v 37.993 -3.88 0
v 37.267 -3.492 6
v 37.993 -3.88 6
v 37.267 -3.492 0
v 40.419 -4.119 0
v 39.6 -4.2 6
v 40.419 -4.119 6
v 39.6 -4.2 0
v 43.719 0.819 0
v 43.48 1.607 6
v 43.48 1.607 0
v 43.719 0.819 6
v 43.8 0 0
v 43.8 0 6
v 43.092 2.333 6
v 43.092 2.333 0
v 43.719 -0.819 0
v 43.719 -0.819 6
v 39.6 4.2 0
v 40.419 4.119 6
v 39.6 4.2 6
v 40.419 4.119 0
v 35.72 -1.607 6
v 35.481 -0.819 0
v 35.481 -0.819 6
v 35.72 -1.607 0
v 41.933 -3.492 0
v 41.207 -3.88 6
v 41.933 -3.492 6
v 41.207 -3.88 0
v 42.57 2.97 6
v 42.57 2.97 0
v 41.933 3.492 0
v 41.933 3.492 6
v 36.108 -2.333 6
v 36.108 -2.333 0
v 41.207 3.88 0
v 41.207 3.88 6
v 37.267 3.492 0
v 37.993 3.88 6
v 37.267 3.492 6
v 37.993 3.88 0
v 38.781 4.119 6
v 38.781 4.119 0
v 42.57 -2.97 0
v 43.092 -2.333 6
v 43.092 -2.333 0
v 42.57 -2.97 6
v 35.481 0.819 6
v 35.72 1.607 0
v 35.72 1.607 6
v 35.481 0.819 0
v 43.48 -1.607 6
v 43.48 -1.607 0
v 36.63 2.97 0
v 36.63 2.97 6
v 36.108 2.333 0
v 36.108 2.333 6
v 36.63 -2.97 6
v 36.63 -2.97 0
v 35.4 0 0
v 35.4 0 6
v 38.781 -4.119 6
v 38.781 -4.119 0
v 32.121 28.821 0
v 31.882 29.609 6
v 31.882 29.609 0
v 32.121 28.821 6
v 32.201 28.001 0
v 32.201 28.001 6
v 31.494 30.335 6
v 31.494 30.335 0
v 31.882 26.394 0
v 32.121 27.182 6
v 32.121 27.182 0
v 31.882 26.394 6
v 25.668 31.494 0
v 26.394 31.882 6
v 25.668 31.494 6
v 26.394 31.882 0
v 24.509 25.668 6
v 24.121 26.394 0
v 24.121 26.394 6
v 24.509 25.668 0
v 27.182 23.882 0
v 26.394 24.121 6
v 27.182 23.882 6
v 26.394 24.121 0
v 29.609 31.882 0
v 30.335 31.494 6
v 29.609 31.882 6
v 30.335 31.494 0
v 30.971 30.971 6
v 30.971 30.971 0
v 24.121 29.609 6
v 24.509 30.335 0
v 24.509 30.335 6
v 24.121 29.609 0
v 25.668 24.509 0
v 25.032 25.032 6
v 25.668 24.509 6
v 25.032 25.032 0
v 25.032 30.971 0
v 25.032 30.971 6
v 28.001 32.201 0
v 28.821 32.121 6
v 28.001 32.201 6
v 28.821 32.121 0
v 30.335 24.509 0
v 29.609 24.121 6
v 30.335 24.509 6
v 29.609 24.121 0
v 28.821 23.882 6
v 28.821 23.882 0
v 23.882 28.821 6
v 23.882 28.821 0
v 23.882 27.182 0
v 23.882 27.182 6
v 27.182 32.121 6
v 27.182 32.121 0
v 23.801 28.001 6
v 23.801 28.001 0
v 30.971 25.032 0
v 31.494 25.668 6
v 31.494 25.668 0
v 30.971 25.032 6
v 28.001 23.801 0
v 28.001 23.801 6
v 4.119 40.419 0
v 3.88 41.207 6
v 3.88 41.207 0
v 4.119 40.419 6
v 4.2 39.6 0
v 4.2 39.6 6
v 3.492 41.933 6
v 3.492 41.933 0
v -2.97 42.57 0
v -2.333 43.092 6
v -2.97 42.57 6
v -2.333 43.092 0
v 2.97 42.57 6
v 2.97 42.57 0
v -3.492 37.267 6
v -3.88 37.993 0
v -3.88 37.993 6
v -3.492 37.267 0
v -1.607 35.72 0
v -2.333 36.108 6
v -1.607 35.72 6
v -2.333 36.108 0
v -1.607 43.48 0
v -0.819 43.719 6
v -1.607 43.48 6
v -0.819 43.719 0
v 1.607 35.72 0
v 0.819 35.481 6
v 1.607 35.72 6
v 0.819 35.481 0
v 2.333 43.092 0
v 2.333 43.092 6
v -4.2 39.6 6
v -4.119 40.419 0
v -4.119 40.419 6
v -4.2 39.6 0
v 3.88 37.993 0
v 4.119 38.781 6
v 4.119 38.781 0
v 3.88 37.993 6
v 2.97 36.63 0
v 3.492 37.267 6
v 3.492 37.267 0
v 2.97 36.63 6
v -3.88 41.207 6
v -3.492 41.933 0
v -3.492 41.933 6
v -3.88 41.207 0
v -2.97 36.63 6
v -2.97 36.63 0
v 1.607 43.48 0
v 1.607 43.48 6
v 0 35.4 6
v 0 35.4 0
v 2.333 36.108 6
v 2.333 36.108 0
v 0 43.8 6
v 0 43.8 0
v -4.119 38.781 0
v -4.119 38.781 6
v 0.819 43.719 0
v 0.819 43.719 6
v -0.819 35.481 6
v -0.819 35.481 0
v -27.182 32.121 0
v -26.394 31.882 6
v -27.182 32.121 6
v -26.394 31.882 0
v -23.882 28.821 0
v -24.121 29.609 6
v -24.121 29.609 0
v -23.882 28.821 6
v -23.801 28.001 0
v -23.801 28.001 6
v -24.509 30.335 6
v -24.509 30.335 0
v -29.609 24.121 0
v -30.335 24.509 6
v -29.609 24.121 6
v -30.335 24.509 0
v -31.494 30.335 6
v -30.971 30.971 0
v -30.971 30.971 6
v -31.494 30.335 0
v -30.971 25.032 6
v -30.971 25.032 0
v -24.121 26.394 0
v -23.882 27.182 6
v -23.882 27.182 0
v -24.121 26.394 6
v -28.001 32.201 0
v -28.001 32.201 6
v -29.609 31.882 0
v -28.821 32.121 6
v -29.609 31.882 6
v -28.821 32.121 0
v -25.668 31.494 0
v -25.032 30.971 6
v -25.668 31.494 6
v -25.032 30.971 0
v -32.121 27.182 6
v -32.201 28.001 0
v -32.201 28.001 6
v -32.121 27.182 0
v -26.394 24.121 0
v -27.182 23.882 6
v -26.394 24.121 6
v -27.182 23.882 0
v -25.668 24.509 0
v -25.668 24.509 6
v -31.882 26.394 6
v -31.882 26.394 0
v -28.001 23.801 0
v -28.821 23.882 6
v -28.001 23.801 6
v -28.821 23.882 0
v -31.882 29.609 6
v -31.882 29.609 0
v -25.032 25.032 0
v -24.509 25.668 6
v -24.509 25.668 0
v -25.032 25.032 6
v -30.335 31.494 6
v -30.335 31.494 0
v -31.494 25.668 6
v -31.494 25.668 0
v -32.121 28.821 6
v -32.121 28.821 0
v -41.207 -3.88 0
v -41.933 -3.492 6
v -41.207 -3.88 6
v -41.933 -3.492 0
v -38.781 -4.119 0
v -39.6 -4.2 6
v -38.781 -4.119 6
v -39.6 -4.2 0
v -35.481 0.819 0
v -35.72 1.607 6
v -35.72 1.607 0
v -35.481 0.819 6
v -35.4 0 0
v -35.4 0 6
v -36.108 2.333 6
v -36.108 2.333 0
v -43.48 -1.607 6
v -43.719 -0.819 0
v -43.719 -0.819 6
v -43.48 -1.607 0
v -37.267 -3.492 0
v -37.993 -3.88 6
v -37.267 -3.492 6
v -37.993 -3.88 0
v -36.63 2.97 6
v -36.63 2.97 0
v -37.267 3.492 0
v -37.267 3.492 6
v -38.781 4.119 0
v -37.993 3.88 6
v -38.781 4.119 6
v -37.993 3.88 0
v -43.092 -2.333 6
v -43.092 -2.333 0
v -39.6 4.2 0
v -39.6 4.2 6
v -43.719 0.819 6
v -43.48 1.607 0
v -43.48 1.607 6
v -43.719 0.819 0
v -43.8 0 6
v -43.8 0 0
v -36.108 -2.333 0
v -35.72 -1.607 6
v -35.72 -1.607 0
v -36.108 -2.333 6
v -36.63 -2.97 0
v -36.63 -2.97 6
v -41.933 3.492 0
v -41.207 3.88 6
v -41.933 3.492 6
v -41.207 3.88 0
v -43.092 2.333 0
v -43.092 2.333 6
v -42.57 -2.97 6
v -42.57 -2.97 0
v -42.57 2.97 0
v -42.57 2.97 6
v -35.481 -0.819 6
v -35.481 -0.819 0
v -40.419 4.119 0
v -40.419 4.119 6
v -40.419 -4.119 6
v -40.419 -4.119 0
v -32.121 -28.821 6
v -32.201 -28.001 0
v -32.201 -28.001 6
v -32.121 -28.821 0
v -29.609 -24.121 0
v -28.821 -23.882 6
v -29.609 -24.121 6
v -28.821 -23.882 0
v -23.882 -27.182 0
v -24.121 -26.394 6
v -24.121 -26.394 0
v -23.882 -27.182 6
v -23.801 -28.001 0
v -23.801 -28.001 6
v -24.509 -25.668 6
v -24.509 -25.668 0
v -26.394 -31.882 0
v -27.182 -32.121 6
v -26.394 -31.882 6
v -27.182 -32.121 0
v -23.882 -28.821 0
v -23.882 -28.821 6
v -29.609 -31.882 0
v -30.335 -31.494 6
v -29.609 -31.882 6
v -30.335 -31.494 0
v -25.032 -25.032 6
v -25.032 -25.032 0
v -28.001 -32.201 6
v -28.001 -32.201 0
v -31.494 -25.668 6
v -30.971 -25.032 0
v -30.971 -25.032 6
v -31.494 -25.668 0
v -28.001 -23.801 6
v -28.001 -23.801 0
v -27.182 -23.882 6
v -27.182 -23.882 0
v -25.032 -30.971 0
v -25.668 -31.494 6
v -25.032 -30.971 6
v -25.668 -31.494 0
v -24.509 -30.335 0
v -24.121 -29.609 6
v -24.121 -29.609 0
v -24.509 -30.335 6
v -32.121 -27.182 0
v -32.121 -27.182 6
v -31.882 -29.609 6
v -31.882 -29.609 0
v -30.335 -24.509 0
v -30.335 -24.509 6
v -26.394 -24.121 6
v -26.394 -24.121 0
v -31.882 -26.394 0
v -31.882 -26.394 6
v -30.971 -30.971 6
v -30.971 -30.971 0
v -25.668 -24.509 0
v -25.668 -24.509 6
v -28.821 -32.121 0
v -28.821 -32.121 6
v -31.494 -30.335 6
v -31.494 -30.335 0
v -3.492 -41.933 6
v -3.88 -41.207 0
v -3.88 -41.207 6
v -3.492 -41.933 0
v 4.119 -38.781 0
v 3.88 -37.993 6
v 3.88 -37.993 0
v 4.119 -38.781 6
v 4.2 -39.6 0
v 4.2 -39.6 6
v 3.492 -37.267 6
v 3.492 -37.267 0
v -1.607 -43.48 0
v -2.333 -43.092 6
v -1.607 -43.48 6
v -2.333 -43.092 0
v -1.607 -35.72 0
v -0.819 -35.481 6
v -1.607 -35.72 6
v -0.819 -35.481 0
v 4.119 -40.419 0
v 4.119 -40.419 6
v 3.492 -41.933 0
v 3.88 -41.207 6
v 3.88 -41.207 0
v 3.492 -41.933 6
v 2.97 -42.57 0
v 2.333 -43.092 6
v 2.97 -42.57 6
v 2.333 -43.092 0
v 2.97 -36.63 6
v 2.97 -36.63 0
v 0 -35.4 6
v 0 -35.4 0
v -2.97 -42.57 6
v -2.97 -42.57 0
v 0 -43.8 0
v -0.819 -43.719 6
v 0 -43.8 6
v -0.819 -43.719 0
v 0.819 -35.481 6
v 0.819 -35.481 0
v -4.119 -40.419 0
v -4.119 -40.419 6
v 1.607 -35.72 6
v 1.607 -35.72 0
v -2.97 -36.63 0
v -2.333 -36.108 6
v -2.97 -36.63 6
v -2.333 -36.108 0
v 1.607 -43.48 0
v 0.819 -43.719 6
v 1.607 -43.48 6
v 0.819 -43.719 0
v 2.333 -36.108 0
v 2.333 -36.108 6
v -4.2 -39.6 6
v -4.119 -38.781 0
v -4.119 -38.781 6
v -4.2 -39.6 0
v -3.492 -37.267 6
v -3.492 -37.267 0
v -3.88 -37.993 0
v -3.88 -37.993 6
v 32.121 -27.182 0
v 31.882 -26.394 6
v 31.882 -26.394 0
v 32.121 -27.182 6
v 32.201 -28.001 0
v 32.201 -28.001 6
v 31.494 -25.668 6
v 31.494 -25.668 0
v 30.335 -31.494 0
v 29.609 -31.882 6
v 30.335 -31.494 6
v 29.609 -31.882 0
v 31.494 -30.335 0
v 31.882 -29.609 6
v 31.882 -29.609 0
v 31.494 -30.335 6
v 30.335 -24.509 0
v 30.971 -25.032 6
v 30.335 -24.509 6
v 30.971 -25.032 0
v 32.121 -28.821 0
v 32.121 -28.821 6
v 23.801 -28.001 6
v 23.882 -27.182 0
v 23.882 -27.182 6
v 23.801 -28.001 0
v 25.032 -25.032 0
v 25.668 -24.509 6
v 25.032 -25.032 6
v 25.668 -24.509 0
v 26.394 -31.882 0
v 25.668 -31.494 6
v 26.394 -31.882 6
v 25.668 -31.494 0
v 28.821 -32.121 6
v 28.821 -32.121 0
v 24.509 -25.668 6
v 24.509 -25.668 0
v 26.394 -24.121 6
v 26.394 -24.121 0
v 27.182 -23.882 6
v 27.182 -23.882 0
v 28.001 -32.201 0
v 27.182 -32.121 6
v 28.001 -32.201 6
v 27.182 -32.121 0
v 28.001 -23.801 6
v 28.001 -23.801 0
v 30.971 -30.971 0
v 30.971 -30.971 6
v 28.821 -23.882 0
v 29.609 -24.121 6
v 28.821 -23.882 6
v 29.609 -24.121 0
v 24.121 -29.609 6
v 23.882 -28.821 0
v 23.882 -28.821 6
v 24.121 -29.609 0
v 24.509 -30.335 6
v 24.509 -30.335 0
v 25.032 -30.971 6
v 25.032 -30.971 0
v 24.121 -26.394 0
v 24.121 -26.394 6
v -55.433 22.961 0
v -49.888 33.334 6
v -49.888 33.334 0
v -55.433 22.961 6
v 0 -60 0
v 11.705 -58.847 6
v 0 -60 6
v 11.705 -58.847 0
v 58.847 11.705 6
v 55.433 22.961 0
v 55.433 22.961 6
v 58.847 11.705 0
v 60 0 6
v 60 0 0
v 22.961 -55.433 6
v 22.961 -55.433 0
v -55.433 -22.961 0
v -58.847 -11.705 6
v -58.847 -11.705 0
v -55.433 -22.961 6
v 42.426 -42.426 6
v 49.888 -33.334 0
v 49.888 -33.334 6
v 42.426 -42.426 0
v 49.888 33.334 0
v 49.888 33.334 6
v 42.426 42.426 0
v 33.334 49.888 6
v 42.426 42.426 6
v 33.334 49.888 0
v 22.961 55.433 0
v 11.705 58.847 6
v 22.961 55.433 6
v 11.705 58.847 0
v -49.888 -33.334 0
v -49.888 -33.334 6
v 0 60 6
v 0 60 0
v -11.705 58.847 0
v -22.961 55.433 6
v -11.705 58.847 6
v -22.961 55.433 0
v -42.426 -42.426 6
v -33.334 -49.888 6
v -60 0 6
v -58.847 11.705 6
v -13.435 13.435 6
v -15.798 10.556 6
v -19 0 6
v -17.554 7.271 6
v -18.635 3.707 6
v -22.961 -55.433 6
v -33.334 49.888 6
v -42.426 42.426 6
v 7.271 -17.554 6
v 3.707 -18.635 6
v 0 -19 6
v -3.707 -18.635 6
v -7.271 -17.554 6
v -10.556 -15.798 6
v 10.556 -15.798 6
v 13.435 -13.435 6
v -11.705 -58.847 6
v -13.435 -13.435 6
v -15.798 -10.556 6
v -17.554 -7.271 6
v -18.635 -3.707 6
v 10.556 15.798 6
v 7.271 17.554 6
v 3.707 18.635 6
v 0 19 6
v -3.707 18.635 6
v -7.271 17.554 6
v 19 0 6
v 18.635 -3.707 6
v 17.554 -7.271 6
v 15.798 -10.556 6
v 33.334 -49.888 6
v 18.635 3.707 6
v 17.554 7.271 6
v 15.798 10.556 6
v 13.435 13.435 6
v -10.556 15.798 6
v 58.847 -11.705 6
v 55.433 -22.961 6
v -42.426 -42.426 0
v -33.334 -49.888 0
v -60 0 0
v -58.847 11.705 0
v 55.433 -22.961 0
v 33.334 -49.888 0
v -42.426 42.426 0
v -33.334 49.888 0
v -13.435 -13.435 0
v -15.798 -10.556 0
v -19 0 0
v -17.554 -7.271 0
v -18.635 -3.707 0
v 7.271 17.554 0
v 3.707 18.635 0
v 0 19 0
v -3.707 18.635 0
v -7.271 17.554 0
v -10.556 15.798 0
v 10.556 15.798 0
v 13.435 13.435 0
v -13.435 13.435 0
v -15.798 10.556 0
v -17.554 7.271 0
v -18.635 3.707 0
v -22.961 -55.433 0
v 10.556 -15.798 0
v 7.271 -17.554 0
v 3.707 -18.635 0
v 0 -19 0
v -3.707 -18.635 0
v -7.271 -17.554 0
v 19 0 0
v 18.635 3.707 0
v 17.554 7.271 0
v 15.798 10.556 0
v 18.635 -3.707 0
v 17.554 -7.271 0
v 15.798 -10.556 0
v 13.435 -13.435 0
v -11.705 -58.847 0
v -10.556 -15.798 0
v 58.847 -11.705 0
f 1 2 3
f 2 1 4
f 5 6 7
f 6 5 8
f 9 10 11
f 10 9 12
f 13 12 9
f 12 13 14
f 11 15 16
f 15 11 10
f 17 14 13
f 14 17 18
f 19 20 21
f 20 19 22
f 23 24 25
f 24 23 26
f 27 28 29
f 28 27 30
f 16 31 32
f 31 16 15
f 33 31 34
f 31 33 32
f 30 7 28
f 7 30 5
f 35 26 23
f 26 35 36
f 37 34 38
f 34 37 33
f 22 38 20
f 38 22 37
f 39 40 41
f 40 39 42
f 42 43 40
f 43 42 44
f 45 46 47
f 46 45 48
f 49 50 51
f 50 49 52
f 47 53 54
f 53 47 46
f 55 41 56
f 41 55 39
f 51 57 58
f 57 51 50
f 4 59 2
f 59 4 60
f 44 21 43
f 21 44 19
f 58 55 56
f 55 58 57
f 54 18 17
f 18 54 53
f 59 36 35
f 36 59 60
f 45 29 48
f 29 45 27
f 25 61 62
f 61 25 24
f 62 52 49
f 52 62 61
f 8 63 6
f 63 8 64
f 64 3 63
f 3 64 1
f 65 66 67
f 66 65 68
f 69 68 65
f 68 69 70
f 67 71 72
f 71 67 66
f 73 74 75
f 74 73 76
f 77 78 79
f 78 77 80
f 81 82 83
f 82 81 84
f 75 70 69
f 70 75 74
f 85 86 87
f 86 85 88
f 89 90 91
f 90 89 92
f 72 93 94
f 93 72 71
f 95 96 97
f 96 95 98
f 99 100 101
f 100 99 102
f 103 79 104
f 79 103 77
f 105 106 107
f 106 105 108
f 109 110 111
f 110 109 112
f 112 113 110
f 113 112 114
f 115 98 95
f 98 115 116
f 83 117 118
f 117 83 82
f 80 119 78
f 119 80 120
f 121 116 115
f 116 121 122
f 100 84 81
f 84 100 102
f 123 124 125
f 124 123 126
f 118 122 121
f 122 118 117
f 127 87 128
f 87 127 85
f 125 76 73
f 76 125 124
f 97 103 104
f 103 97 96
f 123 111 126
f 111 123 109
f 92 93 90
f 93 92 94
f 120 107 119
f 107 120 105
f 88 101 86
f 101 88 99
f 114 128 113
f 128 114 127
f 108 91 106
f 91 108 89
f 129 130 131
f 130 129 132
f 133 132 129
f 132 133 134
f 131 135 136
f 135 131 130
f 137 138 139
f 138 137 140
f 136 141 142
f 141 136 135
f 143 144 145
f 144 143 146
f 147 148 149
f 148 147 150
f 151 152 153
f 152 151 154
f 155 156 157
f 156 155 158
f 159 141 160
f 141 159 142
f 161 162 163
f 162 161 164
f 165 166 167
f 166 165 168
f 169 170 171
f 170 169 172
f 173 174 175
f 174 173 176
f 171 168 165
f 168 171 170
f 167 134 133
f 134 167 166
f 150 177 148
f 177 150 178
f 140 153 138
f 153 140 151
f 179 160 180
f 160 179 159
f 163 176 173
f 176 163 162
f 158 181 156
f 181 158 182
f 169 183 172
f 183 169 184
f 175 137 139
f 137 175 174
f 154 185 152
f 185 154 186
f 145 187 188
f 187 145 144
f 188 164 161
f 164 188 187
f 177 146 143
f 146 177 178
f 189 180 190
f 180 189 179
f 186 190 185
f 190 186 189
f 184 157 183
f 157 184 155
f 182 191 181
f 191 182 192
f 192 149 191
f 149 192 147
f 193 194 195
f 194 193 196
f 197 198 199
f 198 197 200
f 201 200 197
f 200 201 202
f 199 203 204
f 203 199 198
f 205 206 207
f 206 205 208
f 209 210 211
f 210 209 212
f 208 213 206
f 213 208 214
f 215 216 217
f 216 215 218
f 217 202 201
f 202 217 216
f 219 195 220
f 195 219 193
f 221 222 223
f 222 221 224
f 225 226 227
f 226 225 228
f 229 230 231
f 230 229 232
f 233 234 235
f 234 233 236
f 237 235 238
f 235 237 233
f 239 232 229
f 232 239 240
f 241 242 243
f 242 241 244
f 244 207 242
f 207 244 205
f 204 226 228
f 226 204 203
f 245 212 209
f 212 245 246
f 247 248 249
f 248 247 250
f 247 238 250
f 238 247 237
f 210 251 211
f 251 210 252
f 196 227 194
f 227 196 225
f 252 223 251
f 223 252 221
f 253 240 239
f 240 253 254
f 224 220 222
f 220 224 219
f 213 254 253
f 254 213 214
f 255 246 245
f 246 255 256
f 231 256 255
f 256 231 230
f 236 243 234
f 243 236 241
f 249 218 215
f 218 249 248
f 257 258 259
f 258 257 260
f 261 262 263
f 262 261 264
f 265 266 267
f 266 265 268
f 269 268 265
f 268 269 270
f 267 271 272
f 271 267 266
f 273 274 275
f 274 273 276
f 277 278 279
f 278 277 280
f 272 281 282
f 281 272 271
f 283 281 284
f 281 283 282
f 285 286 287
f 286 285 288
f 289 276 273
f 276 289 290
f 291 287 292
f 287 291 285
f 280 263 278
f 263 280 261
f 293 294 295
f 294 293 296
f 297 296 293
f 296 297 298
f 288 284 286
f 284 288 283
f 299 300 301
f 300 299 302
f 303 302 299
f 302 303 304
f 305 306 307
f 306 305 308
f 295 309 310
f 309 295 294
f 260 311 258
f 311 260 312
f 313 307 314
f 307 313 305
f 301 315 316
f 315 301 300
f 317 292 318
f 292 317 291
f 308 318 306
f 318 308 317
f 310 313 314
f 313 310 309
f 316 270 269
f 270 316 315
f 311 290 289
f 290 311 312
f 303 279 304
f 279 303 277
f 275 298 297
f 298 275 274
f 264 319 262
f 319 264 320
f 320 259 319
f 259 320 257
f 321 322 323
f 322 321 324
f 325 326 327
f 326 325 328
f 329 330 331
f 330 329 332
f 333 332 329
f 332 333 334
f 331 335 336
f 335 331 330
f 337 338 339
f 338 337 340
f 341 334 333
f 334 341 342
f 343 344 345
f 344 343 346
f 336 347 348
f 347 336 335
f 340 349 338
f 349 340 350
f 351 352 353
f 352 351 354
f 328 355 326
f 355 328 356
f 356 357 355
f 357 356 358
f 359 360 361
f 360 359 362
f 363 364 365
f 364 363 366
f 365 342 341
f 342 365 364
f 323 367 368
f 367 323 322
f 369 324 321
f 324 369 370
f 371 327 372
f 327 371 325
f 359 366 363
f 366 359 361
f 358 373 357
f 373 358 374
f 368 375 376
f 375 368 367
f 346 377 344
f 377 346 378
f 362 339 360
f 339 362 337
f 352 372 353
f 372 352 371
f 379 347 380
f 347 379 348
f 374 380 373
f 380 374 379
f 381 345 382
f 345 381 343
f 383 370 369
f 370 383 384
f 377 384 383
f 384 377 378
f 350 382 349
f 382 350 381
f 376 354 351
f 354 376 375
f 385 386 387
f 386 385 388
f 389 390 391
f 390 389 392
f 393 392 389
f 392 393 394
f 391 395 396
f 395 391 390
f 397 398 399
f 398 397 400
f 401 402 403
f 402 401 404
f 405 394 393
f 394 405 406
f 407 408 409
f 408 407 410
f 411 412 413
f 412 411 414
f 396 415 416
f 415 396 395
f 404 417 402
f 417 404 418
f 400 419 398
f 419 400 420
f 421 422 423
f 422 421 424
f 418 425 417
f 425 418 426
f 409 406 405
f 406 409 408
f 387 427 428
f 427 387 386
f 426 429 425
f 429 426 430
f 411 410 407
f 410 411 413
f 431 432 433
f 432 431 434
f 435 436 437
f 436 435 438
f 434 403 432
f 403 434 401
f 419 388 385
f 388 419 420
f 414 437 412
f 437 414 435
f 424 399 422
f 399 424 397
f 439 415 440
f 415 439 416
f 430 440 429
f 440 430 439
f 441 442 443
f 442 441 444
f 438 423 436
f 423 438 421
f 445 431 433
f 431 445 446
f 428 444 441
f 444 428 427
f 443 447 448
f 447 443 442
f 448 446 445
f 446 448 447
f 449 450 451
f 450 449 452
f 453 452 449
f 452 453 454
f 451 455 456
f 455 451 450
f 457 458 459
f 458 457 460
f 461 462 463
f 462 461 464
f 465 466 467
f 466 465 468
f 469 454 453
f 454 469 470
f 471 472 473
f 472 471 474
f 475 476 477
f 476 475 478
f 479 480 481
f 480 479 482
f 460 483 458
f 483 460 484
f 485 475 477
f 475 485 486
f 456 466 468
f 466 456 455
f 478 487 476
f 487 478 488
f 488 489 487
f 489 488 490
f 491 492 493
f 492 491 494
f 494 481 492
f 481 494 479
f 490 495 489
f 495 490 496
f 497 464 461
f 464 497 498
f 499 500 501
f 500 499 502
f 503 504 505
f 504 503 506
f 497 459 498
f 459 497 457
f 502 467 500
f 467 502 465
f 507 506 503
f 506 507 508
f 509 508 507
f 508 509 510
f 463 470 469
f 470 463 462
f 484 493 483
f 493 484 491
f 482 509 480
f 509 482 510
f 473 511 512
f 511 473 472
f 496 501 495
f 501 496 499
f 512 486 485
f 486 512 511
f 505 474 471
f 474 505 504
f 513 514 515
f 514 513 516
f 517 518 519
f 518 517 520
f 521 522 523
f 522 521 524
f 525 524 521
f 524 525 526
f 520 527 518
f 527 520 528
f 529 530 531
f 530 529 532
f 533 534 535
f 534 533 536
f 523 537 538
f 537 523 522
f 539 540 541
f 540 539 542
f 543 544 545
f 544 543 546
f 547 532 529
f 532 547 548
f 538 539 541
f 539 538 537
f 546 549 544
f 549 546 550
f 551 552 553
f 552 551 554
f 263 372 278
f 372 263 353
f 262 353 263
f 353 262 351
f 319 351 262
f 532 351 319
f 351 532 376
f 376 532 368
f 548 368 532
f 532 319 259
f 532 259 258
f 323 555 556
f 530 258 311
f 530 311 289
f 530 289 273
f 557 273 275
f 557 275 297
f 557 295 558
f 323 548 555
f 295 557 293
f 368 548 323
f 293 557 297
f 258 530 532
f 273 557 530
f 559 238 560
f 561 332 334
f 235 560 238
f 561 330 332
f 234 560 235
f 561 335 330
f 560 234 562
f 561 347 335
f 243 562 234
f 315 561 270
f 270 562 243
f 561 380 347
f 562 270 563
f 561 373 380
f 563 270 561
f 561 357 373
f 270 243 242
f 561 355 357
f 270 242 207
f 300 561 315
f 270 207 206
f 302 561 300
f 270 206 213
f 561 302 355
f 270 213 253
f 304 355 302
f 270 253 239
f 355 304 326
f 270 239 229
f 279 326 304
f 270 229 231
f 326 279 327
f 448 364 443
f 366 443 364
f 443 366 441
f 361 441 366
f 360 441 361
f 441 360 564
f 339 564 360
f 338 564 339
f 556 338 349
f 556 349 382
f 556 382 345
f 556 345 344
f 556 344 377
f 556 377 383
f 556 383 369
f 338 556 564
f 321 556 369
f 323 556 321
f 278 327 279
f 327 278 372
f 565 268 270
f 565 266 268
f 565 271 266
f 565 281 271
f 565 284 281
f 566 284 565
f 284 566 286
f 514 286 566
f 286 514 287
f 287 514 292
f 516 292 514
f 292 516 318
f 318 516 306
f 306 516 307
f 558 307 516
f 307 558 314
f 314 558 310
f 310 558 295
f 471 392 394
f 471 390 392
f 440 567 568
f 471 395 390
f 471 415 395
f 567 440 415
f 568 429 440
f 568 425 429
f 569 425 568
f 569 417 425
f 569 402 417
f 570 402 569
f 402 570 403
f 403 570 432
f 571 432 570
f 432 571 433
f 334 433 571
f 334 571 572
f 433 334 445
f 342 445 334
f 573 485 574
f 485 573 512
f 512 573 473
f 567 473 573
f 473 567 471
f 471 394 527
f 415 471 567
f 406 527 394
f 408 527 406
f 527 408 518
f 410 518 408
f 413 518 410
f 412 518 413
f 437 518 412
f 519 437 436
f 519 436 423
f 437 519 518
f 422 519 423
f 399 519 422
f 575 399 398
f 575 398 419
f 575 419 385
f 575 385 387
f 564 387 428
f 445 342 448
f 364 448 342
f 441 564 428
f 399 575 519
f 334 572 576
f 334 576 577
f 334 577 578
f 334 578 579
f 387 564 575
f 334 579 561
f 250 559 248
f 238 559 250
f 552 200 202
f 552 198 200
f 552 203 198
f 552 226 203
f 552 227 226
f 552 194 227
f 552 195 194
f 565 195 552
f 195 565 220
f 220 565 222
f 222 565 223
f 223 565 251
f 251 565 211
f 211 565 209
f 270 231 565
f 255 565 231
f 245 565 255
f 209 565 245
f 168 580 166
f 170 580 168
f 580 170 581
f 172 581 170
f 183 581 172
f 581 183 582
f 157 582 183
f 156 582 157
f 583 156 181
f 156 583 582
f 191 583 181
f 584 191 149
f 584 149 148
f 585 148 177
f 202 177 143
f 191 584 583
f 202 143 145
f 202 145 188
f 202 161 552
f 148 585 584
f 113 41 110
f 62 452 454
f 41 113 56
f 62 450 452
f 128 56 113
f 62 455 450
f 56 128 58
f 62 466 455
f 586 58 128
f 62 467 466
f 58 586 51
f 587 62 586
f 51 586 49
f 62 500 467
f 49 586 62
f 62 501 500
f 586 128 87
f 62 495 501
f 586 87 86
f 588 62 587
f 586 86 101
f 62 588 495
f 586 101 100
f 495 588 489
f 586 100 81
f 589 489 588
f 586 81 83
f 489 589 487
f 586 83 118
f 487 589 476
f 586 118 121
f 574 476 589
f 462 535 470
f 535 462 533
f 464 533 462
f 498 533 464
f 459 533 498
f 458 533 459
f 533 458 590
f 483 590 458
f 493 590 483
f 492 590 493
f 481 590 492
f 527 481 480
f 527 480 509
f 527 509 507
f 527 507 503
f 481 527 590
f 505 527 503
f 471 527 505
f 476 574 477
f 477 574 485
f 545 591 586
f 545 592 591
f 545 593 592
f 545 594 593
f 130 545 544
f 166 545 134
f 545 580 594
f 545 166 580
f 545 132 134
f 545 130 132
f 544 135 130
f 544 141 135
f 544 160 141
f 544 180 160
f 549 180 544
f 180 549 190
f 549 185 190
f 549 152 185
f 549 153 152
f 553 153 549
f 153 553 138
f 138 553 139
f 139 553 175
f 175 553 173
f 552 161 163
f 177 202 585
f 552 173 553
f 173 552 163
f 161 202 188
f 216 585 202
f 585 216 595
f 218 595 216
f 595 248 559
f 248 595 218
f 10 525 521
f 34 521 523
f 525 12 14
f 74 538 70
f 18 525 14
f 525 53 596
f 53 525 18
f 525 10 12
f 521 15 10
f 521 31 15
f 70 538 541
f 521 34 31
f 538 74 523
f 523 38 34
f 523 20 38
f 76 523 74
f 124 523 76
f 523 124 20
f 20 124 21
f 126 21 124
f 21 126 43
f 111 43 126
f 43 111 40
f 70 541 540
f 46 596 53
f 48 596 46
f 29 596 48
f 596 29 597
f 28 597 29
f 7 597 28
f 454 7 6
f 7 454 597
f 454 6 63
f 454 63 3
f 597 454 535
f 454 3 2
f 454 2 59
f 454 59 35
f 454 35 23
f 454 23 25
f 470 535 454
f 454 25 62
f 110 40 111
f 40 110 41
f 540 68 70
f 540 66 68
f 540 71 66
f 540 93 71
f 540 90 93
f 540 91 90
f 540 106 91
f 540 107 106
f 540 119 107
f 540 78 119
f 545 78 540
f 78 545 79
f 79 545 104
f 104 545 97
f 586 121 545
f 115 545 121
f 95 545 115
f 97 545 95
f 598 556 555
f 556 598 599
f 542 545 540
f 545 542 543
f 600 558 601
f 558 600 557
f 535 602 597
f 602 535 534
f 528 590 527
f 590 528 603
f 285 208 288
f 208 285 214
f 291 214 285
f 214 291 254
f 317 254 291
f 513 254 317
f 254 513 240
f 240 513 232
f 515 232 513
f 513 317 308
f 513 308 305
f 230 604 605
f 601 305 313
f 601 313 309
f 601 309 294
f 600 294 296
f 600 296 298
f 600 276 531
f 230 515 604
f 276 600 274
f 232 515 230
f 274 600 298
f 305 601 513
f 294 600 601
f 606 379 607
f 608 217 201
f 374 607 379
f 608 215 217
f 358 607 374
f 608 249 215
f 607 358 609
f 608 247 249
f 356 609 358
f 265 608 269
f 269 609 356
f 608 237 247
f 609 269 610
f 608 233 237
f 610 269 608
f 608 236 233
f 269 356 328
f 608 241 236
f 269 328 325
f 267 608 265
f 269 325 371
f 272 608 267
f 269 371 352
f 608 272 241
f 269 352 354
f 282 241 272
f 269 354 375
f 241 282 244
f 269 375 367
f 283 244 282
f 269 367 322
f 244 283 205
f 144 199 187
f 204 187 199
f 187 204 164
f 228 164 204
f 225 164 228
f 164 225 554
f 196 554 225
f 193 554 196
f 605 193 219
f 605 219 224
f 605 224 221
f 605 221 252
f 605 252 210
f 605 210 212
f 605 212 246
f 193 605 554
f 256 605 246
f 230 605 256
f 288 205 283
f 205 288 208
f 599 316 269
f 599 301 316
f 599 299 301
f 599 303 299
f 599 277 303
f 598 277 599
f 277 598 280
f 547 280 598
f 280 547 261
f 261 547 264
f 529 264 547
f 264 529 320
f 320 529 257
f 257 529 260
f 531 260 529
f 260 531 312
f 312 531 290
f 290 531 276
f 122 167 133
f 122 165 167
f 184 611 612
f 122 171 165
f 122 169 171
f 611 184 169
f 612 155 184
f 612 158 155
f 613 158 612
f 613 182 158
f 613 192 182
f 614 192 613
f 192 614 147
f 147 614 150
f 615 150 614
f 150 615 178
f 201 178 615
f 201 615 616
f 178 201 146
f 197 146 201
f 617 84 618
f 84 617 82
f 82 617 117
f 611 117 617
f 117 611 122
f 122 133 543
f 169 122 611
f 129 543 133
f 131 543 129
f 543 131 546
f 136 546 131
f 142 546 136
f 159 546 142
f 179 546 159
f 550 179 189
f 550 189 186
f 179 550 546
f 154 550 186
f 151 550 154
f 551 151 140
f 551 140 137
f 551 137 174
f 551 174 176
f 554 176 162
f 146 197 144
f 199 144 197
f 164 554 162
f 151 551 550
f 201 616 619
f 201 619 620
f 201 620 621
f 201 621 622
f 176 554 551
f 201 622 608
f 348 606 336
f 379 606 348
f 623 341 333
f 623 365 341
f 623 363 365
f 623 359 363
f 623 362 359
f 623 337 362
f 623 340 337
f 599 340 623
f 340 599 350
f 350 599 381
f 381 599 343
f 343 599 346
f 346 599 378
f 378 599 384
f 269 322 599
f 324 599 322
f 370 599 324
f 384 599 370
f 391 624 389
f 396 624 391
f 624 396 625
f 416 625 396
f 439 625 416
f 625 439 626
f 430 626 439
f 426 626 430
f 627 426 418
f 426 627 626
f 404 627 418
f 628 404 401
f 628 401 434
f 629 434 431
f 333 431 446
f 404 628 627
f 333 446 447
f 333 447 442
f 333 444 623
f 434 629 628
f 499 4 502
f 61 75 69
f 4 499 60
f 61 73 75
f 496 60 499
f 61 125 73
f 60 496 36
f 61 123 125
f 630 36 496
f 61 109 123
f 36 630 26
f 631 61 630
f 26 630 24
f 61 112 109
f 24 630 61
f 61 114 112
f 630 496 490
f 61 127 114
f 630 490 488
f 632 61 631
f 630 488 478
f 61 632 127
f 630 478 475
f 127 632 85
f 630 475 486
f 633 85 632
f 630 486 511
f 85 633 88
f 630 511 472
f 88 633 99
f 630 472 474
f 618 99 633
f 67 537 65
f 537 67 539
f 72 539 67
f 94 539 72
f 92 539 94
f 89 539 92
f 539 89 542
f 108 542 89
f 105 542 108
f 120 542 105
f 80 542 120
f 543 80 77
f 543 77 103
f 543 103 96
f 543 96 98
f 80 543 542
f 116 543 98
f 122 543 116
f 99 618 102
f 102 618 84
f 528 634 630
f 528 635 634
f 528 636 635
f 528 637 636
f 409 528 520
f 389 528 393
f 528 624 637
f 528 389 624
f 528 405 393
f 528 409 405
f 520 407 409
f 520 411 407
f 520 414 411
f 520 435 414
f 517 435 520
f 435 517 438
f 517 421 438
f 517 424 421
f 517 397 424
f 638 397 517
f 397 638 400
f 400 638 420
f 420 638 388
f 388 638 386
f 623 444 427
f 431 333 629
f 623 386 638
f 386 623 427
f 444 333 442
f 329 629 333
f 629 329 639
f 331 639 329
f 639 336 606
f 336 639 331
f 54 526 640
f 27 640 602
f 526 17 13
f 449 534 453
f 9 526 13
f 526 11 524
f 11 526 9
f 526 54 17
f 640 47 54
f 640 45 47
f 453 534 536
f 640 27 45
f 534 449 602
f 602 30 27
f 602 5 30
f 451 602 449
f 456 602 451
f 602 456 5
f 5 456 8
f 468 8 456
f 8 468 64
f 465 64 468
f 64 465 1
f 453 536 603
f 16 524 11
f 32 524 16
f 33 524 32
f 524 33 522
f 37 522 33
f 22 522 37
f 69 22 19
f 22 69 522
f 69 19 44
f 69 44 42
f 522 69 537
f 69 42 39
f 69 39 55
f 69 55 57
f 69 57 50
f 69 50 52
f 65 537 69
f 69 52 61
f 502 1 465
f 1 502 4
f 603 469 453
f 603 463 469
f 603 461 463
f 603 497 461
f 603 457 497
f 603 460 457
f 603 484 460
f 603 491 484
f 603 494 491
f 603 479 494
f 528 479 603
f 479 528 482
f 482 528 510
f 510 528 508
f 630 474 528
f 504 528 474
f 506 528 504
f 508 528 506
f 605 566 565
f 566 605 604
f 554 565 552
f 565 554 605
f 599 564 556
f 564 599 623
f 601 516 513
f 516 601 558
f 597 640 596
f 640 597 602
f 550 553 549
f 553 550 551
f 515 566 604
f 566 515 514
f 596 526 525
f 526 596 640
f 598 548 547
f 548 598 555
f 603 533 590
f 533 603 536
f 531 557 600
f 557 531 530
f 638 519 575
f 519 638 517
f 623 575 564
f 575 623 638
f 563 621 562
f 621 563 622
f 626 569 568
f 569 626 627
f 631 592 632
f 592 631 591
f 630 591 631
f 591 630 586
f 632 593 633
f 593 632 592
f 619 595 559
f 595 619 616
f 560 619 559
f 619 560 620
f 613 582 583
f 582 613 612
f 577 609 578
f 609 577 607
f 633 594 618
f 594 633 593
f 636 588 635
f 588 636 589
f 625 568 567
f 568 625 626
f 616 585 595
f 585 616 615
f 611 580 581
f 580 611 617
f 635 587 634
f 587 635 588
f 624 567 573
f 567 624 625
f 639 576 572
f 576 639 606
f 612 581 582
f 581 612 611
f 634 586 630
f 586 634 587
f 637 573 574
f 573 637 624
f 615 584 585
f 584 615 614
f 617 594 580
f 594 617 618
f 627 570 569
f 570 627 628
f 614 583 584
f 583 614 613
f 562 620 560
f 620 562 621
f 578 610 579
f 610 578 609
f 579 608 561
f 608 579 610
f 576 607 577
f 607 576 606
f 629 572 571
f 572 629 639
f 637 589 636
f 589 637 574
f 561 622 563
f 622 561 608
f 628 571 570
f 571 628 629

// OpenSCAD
$fn = 32;

// ----------------------------------------------------------------------
// Flange Ø120 x 6
// 8 holes on a Ø79.2 bolt circle, bolted joints
// ----------------------------------------------------------------------

// --- parameters (mm) ---
flange_d = 120;  // outside diameter of the flange
seat_tol = 0.1;  // tolerance at the seating features
free_tol = 0.5;  // general tolerance on the free sizes
thickness = 6;   // flange thickness
holes = 8;       // number of bolt holes
pcd = 79.2;      // bolt circle diameter
start_deg = 0;   // angle of the first hole, from +X
hole_d = 8.4;    // bolt hole diameter
bore_d = 38;     // central through bore
hub_d = 48;      // hub outside diameter
hub_h = 0;       // hub height above the flange face (0 = no hub)

// --- derived feature positions (mm) ---
height = thickness + hub_h;  // = 6   overall height of the part
pcd_r = pcd / 2;             // = 39.6   bolt circle radius
hole_step = 360 / holes;     // = 45   angular pitch
feature_centers = [
  [pcd_r * cos(start_deg + 0 * hole_step), pcd_r * sin(start_deg + 0 * hole_step)],
  [pcd_r * cos(start_deg + 1 * hole_step), pcd_r * sin(start_deg + 1 * hole_step)],
  [pcd_r * cos(start_deg + 2 * hole_step), pcd_r * sin(start_deg + 2 * hole_step)],
  [pcd_r * cos(start_deg + 3 * hole_step), pcd_r * sin(start_deg + 3 * hole_step)],
  [pcd_r * cos(start_deg + 4 * hole_step), pcd_r * sin(start_deg + 4 * hole_step)],
  [pcd_r * cos(start_deg + 5 * hole_step), pcd_r * sin(start_deg + 5 * hole_step)],
  [pcd_r * cos(start_deg + 6 * hole_step), pcd_r * sin(start_deg + 6 * hole_step)],
  [pcd_r * cos(start_deg + 7 * hole_step), pcd_r * sin(start_deg + 7 * hole_step)]
];   // bolt hole centres on the pitch circle

// flange disc, every hole and the bore cut straight through
difference() {
  union() {
    cylinder(d = flange_d, h = thickness);
  }
  translate([0, 0, -1]) cylinder(d = bore_d, h = height + 2);  // bore, through
  for (centre = feature_centers)
    translate([centre[0], centre[1], -1]) cylinder(d = hole_d, h = thickness + 2);
}
